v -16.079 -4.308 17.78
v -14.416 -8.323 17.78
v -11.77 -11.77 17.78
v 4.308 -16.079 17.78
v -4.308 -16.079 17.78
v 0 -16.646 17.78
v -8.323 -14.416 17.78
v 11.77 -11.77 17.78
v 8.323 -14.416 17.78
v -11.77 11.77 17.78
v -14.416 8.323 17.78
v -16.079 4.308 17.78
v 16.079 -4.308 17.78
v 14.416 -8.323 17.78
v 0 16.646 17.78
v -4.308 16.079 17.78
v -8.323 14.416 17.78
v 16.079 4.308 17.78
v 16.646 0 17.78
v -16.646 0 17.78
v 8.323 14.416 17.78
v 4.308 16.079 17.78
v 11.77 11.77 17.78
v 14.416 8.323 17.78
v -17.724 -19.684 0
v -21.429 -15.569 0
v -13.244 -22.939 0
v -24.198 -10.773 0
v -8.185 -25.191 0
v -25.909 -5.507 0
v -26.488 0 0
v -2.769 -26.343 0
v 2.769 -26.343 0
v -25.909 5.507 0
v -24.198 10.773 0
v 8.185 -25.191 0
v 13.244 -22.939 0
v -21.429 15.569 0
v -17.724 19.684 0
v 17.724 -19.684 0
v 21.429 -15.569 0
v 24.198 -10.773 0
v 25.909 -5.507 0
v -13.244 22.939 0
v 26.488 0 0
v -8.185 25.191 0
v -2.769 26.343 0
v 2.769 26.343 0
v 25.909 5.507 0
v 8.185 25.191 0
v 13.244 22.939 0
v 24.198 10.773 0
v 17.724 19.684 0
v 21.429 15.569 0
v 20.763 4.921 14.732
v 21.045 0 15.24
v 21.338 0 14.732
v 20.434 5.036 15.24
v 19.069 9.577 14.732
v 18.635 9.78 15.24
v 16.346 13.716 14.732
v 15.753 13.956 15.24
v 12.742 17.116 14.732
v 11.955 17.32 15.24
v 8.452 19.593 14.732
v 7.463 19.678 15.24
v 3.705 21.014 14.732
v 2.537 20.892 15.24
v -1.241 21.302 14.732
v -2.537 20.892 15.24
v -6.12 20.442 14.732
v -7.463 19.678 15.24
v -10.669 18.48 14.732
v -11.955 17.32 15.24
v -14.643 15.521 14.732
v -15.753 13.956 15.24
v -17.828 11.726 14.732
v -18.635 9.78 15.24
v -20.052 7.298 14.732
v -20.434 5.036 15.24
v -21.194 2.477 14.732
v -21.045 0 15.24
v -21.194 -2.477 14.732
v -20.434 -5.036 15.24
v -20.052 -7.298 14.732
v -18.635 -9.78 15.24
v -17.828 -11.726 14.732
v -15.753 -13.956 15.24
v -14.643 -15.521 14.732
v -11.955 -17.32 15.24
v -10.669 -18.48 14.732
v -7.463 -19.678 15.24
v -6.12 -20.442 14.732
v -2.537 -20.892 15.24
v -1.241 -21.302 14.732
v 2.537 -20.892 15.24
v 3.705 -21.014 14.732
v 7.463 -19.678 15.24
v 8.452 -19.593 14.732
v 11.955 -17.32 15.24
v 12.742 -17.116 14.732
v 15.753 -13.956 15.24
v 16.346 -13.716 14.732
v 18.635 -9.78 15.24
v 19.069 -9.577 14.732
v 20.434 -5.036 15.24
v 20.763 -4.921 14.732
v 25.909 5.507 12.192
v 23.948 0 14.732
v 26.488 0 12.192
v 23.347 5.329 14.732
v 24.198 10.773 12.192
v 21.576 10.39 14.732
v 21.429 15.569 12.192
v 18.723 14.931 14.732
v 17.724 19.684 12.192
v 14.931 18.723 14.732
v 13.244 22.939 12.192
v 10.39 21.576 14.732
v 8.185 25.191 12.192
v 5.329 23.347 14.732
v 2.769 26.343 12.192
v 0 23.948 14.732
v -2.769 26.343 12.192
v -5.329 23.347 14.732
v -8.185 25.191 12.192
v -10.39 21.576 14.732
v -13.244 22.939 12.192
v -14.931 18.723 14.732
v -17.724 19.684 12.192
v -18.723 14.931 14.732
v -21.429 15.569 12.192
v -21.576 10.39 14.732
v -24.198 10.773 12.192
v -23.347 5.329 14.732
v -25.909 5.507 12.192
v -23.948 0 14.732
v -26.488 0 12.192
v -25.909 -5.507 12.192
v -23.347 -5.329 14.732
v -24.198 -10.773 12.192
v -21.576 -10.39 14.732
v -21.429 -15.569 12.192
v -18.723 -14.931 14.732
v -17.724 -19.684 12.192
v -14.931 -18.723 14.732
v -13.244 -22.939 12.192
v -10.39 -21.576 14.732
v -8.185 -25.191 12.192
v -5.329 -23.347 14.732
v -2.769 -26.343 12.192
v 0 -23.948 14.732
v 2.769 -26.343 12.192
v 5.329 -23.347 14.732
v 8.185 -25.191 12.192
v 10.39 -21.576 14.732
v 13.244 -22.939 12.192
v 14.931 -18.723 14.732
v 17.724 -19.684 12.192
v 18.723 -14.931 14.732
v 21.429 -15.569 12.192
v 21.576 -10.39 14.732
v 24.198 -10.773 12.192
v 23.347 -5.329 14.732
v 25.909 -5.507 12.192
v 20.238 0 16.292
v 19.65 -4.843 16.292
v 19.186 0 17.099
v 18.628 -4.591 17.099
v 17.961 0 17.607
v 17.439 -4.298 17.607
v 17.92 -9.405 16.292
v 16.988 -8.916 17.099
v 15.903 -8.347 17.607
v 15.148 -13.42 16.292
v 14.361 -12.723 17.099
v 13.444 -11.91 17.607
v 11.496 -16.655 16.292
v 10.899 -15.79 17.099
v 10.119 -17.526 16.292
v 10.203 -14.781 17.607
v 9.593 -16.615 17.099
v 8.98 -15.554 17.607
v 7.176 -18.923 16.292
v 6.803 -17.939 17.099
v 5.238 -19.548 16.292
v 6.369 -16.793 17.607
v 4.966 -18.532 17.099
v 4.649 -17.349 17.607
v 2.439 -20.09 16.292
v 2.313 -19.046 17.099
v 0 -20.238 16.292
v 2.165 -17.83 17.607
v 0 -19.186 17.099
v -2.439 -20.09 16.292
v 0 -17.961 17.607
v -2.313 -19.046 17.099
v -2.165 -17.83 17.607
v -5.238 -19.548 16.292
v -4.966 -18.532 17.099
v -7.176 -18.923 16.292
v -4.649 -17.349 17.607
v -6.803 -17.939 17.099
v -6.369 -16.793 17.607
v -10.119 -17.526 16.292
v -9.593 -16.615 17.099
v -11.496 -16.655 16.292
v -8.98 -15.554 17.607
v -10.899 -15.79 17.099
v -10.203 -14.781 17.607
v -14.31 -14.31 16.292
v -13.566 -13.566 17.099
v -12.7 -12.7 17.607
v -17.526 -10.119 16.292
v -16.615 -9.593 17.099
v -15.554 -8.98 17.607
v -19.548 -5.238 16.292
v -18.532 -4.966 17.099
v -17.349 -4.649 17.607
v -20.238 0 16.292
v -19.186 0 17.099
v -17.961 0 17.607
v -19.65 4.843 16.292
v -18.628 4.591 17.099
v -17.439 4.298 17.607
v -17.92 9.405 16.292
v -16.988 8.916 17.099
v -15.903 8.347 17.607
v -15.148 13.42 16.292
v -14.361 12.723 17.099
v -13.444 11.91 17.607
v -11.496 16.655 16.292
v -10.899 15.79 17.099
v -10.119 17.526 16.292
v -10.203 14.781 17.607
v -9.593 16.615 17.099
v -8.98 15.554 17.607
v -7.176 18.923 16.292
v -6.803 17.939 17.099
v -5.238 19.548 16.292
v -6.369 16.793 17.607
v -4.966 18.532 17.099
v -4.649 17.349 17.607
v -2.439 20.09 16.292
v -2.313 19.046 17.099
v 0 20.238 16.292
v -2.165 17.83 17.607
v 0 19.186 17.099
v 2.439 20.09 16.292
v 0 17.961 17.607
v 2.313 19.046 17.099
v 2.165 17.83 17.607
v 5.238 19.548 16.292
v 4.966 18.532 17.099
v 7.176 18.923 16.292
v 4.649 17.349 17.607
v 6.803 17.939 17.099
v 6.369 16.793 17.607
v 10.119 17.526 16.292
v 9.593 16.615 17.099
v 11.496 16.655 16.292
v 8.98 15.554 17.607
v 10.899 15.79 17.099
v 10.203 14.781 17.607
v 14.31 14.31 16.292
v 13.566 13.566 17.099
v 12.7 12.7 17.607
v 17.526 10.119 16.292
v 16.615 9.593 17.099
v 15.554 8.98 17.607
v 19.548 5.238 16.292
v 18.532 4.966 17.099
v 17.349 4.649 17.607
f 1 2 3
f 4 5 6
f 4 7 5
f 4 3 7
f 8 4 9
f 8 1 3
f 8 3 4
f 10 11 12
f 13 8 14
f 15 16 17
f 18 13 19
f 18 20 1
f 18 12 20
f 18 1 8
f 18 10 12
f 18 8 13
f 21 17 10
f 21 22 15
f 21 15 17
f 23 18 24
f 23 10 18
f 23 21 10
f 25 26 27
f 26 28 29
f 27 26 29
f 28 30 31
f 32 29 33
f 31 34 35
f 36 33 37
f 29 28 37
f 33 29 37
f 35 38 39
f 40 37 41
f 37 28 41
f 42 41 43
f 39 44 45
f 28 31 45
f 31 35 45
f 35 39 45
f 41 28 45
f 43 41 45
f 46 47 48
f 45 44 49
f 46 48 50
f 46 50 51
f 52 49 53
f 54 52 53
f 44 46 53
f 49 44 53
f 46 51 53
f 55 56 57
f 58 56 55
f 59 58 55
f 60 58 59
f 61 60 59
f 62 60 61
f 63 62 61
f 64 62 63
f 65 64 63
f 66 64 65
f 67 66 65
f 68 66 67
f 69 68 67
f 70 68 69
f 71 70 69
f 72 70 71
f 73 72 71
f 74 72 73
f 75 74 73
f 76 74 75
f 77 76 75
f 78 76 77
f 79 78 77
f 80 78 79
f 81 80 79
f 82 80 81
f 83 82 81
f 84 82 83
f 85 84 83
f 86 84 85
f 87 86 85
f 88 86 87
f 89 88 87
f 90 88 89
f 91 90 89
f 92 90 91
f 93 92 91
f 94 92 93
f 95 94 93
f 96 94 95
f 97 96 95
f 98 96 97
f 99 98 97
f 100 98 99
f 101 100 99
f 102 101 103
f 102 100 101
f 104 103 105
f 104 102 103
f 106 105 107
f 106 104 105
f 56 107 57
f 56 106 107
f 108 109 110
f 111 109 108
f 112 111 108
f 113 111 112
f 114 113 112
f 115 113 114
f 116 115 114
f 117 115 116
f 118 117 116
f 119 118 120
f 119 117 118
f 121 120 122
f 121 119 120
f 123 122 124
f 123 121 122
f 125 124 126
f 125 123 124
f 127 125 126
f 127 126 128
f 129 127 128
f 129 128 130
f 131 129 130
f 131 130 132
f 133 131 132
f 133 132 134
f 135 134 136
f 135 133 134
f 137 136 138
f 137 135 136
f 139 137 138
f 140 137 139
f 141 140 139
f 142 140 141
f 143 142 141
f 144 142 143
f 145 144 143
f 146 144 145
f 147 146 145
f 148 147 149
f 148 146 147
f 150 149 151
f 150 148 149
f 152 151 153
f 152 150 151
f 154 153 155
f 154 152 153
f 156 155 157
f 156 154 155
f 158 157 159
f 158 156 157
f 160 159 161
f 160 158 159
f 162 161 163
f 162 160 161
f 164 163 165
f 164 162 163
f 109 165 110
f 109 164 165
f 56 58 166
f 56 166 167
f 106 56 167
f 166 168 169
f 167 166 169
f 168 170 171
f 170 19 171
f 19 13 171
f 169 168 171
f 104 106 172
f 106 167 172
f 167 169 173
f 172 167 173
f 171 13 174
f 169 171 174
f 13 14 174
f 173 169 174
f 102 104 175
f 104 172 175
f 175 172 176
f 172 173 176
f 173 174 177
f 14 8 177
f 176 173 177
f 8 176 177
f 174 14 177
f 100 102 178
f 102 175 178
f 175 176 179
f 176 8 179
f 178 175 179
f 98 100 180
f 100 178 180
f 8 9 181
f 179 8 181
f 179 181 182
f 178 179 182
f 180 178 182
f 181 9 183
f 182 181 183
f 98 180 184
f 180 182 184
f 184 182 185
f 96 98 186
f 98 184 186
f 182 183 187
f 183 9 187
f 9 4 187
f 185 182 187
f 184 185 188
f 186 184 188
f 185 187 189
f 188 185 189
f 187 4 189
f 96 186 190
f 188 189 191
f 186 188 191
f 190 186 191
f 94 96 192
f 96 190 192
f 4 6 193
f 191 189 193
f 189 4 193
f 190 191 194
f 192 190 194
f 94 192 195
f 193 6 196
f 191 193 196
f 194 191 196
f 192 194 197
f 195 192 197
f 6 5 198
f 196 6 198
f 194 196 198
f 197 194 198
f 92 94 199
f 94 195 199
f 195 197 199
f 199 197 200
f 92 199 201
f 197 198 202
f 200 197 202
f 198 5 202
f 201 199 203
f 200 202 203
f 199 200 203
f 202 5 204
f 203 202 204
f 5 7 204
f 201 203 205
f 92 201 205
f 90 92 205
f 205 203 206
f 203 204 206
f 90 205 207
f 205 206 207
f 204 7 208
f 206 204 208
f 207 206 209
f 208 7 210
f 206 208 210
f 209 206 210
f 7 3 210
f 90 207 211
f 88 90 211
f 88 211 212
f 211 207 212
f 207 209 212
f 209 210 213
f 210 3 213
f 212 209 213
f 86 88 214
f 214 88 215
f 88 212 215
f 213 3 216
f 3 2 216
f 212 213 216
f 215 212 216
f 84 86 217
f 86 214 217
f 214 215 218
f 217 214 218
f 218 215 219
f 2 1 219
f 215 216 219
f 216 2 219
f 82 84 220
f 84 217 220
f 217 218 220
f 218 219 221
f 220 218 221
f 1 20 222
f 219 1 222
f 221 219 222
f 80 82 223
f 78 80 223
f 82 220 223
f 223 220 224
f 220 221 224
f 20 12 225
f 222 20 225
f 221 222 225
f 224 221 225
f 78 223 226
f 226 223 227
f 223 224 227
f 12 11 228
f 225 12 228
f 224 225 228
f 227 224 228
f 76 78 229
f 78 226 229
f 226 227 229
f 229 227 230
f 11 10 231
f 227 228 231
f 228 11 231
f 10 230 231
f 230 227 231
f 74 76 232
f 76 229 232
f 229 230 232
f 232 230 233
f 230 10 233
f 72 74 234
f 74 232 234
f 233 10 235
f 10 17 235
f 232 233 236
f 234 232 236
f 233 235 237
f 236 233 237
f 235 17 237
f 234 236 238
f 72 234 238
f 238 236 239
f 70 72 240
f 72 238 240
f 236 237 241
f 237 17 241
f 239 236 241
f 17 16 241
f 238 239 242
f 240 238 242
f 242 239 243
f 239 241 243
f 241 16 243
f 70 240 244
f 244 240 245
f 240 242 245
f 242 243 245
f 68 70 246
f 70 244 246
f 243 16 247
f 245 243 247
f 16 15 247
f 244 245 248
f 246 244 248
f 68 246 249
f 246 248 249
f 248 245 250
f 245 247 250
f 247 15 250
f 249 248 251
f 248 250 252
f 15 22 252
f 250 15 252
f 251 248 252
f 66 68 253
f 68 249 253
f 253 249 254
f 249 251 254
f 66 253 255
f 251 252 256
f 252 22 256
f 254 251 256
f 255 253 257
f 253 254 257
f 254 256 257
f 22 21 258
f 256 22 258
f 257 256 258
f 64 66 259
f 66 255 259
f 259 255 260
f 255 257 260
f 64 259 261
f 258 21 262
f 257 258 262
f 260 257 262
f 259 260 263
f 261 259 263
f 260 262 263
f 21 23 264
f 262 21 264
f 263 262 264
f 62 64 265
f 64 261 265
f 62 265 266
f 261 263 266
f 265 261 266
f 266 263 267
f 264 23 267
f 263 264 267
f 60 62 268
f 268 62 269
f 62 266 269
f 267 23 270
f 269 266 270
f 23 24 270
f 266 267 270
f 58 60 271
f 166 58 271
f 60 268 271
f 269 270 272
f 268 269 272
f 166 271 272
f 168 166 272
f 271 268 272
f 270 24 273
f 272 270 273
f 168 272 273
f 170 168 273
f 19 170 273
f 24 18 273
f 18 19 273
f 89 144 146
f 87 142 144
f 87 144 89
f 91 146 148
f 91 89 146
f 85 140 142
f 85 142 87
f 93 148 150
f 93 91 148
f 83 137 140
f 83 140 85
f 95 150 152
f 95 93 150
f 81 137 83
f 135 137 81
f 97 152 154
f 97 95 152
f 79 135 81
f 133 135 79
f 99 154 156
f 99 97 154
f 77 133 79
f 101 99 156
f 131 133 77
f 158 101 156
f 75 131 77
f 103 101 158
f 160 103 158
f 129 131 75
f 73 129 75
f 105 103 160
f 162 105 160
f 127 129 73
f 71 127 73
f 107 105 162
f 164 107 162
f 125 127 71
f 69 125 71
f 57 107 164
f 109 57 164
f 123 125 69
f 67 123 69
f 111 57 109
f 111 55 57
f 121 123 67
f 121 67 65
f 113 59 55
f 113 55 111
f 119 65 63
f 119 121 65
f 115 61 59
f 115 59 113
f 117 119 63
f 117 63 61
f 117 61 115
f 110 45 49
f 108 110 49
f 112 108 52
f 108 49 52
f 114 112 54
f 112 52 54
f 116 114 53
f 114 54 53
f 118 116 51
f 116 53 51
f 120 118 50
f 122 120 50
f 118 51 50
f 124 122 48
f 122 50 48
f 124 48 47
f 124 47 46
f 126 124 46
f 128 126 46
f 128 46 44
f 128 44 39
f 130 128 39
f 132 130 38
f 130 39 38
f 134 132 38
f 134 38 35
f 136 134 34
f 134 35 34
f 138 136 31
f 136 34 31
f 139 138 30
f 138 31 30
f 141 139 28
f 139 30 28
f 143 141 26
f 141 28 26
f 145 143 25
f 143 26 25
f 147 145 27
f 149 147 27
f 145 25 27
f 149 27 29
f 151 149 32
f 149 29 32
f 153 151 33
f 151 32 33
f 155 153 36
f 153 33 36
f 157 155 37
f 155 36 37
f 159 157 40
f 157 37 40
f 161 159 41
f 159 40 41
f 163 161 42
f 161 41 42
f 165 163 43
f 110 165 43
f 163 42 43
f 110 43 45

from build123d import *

# Parameters (mm, degrees)
F0_R     = 26.4876043929
F1_DEPTH = 14.732
F2_SIZE  = 2.54
F3_R     = 21.3384472315
F4_DEPTH = 3.048
F4_TAPER = 30
F5_R     = 5.08


with BuildPart() as f1:
    # F0 (on Top) → F1 (new body)
    with BuildSketch(Plane.XY):
        Circle(F0_R)
    extrude(amount=F1_DEPTH)

    # F2
    f2_edges = [f1.edges().sort_by_distance(p)[0] for p in [
        (-26.487604, 0, 14.732),
    ]]
    chamfer(f2_edges, length=F2_SIZE)

    # F3 (on face) → F4 (join)
    with BuildSketch(Plane.XY.offset(14.732)):
        Circle(F3_R)
    extrude(amount=F4_DEPTH, taper=F4_TAPER)

    # F5
    f5_edges = [f1.edges().sort_by_distance(p)[0] for p in [
        (-19.578684, 0, 17.78),
    ]]
    fillet(f5_edges, radius=F5_R)


solid = f1.part
